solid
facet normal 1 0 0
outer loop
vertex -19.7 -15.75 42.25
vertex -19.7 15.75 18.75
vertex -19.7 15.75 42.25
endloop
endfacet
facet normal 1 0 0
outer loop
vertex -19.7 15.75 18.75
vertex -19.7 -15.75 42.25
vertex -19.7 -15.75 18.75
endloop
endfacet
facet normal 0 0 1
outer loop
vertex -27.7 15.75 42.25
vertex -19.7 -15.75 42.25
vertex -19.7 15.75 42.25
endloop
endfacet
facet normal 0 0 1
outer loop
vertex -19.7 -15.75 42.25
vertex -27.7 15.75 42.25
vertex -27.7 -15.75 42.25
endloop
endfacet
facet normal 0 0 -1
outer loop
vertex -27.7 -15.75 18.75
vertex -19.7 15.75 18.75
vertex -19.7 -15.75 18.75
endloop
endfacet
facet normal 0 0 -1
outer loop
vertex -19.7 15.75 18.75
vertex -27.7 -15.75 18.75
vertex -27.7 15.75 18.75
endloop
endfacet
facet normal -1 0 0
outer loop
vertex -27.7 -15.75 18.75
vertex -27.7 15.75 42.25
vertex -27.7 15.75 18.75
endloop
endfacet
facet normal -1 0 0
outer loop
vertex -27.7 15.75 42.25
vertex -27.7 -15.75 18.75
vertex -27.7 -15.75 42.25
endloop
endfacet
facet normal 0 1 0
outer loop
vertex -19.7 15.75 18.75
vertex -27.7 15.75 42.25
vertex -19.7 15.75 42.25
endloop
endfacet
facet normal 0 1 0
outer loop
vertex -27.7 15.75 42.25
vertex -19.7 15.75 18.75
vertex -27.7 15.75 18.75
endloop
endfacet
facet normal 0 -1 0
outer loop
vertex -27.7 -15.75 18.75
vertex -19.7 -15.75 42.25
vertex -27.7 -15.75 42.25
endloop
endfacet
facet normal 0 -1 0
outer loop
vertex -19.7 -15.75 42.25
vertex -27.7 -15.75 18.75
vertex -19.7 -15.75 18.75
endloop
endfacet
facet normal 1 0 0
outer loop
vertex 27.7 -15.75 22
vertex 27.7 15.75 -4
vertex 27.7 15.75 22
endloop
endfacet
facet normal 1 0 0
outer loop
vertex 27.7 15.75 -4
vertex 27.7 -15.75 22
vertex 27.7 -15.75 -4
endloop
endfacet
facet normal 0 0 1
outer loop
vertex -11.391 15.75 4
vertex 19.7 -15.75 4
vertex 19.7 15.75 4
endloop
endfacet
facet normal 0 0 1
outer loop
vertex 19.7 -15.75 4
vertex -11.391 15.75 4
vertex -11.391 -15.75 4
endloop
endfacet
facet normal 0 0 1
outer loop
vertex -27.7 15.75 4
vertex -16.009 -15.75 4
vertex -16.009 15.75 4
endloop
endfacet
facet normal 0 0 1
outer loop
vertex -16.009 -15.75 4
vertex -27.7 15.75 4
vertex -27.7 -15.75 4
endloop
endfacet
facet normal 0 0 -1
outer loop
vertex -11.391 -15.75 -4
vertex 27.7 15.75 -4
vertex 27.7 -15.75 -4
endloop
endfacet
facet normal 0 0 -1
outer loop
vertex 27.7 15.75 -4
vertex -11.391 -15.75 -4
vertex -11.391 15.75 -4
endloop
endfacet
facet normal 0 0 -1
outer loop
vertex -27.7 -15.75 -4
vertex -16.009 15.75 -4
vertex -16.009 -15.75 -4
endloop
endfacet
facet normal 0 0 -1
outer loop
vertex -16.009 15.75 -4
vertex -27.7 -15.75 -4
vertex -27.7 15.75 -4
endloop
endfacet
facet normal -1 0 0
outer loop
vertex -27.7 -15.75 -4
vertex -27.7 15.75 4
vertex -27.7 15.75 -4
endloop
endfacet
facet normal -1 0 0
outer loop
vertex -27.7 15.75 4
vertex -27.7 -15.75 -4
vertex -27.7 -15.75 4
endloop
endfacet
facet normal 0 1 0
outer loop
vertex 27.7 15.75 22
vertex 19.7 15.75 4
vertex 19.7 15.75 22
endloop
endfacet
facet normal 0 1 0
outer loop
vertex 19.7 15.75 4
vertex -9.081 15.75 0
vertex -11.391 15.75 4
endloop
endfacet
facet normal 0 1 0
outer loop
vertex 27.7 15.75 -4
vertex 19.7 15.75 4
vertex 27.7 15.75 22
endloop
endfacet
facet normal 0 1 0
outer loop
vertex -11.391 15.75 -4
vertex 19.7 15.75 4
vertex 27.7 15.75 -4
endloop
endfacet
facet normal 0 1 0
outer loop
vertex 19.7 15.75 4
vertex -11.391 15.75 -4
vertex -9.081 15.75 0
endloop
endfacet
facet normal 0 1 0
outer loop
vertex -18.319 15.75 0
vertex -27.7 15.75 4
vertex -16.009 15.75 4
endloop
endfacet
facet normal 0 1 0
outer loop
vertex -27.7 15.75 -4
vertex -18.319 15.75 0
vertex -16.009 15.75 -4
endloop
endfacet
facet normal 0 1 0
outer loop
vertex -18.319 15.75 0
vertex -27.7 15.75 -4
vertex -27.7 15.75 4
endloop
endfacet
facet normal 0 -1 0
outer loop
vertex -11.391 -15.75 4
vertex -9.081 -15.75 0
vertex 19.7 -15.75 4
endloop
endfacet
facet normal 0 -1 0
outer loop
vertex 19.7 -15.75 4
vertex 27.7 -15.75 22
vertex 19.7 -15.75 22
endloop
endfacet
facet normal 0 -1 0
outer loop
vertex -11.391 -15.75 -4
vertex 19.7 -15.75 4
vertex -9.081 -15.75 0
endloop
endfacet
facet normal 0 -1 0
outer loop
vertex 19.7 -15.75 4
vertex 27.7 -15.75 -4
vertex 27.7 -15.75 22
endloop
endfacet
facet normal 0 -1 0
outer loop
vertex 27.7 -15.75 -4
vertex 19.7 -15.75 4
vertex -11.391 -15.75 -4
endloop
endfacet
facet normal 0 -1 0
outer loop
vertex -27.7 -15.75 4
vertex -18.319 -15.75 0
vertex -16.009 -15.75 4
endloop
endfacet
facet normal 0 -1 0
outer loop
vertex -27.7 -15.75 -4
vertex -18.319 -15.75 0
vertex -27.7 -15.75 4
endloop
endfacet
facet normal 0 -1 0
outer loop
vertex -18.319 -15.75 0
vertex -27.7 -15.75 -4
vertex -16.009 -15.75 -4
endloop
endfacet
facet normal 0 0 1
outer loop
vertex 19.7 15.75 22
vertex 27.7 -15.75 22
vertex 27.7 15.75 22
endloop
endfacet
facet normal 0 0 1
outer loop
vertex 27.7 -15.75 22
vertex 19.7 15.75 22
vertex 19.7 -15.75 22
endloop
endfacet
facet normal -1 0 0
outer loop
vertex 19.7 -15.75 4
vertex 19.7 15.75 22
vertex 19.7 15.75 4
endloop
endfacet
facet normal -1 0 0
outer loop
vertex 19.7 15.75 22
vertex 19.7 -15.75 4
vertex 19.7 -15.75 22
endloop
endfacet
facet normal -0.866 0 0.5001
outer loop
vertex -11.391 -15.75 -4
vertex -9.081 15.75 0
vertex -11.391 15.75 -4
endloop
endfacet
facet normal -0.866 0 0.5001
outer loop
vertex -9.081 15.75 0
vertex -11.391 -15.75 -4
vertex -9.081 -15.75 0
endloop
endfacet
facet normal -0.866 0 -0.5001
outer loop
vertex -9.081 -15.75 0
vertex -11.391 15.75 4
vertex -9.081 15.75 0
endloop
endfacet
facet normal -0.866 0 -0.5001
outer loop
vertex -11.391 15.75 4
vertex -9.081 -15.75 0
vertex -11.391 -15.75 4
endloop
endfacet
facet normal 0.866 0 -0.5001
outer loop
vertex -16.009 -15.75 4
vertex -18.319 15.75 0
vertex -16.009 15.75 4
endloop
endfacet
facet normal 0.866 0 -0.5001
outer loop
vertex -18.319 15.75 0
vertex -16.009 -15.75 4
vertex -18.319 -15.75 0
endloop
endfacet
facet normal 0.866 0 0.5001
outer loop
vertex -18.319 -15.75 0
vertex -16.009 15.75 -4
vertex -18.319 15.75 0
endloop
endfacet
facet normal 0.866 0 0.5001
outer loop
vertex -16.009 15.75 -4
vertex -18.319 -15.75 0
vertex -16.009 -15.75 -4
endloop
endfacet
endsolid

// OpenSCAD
$fn=64;

L = 55.4;
W = 31.5;
H = 37.5;

bar_t = 8.0;
leg_t = 8.0;

long_leg_h = 29.5;
short_leg_h = 18.0;

taper_h = 6.0;
taper_inset = 2.0;

hex_flat = 8.0;
hex_r = hex_flat / sqrt(3);
hex_hole_z = 0;
hex_hole_x = -L/2 + 14.0;

module hex_prism(r, h){
    cylinder(h=h, r=r, center=true, $fn=6);
}

module tapered_leg(t, w, h, taper_h, inset){
    union(){
        translate([0,0,(h - taper_h)/2])
            cube([t, w, h - taper_h], center=true);
        translate([0,0,h/2 - taper_h/2])
            hull(){
                cube([t, w, 0.01], center=true);
                translate([0,0,taper_h])
                    cube([max(0.01, t - 2*inset), max(0.01, w - 2*inset), 0.01], center=true);
            }
    }
}

module bracket_body(){
    union(){
        cube([L, W, bar_t], center=true);

        translate([-L/2 + leg_t/2, 0, bar_t/2 + long_leg_h/2])
            tapered_leg(leg_t, W, long_leg_h, taper_h, taper_inset);

        translate([ L/2 - leg_t/2, 0, bar_t/2 + short_leg_h/2])
            cube([leg_t, W, short_leg_h], center=true);
    }
}

difference(){
    bracket_body();
    translate([hex_hole_x, 0, hex_hole_z])
        rotate([90,0,0])
            hex_prism(hex_r, W + 2);
}
